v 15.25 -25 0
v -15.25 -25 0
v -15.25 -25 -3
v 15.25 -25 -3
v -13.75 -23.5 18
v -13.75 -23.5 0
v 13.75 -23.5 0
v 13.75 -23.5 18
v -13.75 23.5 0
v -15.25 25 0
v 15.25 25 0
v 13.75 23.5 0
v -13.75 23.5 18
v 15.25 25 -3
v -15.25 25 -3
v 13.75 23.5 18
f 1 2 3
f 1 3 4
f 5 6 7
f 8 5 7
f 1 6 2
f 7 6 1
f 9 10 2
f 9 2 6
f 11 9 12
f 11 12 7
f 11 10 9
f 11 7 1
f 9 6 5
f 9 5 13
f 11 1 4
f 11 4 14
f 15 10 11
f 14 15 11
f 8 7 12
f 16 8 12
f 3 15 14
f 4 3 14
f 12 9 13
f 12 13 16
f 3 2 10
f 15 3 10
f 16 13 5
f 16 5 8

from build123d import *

# Parameters (mm, degrees)
F0_W     = 27.5
F0_H     = 47
F1_DEPTH = 18
F0_W_2   = 30.5
F0_H_2   = 50
F2_DEPTH = 3


with BuildPart() as f1:
    # F0 (on Top) → F1 (new body)
    with BuildSketch(Plane.XY):
        Rectangle(F0_W, F0_H)
    extrude(amount=F1_DEPTH)

    # F0 (on Top) → F2 (join)
    with BuildSketch(Plane.XY):
        Rectangle(F0_W_2, F0_H_2)
        Rectangle(F0_W, F0_H, mode=Mode.SUBTRACT)
        Rectangle(F0_W, F0_H)
    extrude(amount=-F2_DEPTH)


solid = f1.part
